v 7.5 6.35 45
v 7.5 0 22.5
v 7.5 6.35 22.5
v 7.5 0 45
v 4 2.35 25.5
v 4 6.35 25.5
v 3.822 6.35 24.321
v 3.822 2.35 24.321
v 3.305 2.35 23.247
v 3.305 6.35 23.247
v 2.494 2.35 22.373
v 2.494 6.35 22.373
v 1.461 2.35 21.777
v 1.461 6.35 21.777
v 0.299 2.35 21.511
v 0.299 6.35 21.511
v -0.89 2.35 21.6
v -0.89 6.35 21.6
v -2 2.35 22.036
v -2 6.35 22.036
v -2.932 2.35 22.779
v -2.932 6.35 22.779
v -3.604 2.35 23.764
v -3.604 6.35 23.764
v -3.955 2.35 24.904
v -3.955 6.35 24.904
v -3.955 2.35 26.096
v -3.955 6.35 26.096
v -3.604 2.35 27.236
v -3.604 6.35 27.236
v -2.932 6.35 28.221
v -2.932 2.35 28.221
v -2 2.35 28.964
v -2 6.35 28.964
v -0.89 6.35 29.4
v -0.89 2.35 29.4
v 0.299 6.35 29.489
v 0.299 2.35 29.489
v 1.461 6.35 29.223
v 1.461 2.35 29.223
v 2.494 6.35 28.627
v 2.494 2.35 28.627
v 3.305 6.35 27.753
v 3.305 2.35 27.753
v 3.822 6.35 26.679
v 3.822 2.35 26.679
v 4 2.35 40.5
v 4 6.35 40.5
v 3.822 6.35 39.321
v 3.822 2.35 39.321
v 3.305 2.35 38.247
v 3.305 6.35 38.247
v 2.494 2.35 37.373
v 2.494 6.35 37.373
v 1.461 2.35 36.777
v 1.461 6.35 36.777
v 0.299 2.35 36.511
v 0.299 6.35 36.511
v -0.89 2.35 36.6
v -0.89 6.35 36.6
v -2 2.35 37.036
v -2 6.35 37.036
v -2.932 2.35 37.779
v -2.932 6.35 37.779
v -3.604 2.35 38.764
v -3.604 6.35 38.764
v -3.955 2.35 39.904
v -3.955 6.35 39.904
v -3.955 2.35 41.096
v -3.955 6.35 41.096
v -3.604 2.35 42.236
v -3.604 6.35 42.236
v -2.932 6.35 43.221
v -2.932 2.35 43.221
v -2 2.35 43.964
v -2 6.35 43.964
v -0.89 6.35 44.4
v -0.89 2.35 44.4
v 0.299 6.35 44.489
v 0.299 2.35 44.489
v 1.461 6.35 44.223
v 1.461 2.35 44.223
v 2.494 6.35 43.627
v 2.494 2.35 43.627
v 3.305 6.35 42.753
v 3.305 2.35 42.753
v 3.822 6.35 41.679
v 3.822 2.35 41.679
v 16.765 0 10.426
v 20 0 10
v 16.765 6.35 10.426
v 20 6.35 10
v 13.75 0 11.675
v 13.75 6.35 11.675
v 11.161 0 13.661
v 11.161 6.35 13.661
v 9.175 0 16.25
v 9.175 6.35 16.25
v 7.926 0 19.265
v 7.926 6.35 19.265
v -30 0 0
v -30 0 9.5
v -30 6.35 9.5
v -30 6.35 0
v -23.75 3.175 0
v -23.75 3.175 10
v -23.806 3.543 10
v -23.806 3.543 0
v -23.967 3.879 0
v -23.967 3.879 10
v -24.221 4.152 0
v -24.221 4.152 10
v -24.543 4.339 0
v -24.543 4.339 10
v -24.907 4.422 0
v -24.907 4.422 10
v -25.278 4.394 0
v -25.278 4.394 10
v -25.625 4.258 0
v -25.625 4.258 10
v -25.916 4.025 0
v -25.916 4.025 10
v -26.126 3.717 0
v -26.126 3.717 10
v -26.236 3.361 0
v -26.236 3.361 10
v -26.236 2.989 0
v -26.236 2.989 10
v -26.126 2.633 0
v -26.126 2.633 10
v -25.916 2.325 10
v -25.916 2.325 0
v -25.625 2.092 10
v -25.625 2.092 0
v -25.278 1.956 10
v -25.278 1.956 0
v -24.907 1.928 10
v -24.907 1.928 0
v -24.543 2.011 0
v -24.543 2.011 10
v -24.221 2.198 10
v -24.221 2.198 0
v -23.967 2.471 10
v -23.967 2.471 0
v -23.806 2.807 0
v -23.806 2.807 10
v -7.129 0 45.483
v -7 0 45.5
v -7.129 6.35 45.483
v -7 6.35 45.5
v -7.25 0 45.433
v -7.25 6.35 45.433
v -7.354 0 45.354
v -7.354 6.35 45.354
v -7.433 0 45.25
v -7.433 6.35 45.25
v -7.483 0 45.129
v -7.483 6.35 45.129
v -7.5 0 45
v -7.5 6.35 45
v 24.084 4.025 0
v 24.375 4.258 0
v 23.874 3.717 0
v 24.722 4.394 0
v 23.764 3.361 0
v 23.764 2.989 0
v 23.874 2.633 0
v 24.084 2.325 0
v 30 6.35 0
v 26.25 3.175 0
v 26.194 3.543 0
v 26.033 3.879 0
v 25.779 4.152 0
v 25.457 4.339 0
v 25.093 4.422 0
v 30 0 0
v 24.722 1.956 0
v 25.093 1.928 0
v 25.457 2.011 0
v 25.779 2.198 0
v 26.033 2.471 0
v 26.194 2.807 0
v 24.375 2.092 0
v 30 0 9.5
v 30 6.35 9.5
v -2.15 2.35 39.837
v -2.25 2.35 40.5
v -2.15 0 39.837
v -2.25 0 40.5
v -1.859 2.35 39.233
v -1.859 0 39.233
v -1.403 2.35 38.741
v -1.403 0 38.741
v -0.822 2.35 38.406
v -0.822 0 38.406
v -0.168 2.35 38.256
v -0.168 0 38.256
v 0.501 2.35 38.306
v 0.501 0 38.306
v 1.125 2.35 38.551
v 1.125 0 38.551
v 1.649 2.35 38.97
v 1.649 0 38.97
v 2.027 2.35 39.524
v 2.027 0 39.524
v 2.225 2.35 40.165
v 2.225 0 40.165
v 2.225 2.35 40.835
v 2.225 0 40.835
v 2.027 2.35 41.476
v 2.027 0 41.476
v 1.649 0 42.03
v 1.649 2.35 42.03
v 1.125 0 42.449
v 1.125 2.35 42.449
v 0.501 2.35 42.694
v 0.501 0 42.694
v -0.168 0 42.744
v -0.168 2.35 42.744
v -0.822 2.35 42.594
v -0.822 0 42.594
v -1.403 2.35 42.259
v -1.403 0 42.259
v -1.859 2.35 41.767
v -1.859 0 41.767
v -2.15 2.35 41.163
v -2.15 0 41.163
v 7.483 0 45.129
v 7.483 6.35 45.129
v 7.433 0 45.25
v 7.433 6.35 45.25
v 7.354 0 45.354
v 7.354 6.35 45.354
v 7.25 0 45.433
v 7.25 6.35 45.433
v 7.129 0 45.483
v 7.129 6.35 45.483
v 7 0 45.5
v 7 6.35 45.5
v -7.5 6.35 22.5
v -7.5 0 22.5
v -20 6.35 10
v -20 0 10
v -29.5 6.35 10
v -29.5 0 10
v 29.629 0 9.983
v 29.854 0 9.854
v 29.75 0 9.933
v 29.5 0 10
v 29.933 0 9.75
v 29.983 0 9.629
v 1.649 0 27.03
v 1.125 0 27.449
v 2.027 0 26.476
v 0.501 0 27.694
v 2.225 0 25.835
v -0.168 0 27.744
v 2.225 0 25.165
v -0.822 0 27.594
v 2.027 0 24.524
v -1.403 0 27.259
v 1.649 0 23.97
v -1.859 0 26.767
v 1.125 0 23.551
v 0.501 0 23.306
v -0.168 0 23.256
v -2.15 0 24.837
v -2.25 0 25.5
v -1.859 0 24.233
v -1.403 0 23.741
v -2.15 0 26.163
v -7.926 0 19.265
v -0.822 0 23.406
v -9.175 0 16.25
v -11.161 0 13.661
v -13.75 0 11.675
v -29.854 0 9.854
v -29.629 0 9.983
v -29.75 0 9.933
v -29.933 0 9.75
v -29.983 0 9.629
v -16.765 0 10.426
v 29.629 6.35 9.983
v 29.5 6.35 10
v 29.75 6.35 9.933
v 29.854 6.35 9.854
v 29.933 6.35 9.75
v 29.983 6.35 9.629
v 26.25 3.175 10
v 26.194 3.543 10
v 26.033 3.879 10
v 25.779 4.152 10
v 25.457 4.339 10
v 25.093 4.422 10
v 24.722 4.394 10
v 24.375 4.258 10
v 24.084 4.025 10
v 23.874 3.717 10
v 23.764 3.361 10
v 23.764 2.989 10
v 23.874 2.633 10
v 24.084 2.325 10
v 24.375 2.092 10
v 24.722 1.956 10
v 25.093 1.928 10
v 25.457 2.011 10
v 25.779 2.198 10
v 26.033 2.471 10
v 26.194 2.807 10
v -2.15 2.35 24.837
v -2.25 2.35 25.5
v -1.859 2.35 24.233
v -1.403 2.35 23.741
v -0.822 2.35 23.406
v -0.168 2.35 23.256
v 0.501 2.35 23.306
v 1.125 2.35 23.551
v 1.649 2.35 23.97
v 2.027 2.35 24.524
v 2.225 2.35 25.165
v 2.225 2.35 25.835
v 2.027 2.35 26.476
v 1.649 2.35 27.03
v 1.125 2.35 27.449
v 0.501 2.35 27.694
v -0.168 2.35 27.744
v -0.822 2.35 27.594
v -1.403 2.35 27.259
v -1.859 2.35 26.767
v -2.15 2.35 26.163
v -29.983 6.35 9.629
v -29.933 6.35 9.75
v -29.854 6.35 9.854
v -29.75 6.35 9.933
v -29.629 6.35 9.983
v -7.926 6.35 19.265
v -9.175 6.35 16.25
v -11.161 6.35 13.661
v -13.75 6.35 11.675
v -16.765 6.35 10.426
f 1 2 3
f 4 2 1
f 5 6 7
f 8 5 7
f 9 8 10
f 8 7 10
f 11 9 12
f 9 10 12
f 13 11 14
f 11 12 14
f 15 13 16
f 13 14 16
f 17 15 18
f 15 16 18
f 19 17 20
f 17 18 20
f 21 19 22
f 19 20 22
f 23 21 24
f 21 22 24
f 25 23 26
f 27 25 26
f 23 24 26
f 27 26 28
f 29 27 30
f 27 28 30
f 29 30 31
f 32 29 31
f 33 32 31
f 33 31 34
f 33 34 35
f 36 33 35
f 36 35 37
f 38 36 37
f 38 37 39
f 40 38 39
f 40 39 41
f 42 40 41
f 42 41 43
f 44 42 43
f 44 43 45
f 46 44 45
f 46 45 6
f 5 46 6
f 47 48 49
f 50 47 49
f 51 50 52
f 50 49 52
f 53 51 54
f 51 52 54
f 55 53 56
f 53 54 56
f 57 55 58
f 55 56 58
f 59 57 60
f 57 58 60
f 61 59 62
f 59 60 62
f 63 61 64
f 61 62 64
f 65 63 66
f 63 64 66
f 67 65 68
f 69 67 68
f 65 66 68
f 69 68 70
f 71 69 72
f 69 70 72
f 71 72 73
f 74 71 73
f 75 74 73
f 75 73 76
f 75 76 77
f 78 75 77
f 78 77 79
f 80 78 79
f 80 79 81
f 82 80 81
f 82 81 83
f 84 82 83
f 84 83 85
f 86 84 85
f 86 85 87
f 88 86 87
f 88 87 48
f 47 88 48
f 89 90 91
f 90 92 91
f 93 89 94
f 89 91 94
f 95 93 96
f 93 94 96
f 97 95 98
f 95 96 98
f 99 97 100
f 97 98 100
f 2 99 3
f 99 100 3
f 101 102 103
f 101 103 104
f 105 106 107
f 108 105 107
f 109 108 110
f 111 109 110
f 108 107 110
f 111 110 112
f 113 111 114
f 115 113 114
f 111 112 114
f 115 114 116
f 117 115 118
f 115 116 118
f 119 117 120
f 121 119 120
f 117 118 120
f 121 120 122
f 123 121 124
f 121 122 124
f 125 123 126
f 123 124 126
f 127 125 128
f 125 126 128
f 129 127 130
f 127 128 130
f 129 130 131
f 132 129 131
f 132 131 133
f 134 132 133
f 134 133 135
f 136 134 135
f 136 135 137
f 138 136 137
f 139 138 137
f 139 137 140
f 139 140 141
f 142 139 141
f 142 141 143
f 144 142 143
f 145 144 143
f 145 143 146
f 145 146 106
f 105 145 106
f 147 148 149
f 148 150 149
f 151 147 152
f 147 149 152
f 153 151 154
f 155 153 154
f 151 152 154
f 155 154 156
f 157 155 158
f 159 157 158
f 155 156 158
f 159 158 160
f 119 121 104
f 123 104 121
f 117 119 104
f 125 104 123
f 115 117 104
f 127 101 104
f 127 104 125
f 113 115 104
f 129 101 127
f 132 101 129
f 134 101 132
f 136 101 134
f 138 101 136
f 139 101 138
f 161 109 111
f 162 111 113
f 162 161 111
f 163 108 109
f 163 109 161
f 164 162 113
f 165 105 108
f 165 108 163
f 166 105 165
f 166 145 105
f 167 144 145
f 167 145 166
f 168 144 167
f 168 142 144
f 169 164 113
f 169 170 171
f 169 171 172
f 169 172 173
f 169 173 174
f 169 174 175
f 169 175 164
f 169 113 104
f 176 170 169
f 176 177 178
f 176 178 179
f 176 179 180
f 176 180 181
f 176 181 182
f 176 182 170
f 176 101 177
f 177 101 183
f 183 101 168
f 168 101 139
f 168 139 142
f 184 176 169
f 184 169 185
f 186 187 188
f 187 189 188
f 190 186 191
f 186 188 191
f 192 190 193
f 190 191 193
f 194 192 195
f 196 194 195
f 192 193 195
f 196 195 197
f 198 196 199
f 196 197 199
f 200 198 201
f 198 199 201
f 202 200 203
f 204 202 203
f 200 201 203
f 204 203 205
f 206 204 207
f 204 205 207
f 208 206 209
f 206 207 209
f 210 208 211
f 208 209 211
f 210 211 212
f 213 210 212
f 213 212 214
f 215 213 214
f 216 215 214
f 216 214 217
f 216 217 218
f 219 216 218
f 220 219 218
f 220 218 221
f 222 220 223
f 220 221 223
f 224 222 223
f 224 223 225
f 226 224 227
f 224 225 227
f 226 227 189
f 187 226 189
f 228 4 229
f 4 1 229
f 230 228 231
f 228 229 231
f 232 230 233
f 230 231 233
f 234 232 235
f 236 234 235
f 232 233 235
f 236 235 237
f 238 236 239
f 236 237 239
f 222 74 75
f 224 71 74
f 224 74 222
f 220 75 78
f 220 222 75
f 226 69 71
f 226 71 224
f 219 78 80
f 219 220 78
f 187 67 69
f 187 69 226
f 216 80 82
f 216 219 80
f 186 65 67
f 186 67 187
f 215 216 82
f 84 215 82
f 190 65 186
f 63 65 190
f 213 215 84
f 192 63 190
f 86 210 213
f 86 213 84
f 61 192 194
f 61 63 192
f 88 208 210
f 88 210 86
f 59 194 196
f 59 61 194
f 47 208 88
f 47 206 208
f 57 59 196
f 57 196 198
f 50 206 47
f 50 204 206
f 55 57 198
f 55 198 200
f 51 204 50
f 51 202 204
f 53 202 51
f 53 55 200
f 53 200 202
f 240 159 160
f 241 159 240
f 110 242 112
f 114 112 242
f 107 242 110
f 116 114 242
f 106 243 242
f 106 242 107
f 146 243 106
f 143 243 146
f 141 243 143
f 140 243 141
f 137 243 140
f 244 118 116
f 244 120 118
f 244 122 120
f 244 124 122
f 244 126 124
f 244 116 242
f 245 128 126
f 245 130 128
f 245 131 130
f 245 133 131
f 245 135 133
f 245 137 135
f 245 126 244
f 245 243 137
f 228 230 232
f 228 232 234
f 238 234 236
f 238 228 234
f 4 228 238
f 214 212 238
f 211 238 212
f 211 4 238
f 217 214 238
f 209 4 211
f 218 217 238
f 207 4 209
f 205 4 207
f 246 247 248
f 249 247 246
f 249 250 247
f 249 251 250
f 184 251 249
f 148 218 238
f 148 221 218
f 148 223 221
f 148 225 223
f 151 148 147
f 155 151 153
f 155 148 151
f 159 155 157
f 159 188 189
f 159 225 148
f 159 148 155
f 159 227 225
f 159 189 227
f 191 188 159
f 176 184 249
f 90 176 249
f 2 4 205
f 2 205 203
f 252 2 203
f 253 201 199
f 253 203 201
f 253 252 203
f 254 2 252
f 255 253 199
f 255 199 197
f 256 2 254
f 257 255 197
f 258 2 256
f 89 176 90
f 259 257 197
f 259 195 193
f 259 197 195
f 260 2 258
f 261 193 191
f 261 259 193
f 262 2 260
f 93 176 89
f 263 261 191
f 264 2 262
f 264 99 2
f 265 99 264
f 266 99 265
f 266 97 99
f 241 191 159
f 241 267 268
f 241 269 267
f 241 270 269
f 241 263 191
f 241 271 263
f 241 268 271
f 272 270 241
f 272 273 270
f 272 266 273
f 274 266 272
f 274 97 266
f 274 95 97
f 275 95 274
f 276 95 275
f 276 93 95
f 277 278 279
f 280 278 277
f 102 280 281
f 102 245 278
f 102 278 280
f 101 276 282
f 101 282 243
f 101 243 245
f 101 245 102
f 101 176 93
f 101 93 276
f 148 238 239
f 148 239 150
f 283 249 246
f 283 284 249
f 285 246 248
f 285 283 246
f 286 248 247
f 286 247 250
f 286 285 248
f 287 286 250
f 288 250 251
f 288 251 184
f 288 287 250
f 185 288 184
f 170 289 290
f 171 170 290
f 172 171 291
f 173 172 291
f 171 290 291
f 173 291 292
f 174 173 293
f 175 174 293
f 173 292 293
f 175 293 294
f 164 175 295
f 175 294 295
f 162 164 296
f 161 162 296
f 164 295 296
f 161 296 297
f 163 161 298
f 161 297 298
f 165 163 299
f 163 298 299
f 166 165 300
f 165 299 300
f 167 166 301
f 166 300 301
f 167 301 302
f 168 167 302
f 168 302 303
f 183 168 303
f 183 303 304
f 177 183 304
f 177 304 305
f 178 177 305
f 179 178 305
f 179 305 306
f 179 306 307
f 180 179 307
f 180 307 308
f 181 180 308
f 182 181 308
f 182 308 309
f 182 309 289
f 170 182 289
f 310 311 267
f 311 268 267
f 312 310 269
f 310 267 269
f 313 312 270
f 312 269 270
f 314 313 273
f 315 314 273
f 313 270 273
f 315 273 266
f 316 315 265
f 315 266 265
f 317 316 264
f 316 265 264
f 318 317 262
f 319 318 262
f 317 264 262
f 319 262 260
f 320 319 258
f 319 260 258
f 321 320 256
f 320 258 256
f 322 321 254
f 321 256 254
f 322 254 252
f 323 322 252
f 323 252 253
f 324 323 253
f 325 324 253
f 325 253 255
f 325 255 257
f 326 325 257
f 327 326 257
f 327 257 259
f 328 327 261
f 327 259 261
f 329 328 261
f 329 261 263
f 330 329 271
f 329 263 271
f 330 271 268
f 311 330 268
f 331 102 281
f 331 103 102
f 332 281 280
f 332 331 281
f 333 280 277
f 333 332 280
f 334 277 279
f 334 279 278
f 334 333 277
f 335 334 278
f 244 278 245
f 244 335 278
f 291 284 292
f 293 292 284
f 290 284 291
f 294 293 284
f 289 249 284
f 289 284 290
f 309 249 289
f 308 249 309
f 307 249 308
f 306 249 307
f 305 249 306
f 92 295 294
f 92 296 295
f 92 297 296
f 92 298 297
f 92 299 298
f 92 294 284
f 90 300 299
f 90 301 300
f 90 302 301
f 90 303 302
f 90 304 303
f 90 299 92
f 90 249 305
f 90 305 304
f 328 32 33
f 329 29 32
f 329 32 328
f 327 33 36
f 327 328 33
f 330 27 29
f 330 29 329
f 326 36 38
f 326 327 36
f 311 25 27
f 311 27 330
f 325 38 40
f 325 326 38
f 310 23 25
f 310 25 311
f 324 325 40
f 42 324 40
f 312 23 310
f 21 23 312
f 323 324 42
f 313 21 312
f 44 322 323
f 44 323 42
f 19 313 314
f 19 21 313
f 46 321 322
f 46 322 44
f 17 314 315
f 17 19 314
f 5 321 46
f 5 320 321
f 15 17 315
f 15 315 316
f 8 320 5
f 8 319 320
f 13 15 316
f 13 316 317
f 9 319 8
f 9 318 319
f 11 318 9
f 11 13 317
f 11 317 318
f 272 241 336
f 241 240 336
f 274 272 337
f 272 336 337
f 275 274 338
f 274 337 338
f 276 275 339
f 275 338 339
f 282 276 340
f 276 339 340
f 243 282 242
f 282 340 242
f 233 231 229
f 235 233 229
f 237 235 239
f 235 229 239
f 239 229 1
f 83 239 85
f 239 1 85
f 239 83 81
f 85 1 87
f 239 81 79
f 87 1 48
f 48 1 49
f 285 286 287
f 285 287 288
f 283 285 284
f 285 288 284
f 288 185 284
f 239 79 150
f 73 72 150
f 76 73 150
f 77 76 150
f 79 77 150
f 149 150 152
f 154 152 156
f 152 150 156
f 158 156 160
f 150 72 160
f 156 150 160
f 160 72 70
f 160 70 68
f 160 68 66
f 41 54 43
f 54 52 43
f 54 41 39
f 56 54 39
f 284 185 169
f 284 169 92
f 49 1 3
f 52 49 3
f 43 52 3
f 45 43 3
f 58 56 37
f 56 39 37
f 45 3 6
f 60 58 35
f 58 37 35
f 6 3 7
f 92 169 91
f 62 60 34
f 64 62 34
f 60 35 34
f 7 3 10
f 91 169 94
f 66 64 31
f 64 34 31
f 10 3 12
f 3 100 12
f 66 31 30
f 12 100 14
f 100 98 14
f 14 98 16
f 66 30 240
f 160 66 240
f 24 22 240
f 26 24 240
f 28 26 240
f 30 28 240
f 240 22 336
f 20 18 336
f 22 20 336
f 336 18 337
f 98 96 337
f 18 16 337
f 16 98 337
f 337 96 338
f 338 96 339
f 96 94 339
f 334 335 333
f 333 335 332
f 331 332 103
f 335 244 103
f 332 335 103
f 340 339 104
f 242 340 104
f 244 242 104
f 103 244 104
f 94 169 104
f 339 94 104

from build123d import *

# Parameters (mm, degrees)
BOSS_EXTRUDE1_DEPTH            = 6.35
FILLET1_R                      = 12.5
CBORE_FOR_M4_SHCS1_D           = 4.5
CBORE_FOR_M4_SHCS1_CBORE_D     = 8
CBORE_FOR_M4_SHCS1_CBORE_DEPTH = 4
M3X0_5_TAPPED_HOLE1_D          = 2.5
M3X0_5_TAPPED_HOLE1_DEPTH      = 10
FILLET2_R                      = 0.5
FILLET3_R                      = 0.5


with BuildPart() as part:
    # Sketch2 → Boss-Extrude1 (new body)
    with BuildSketch(Plane(origin=(0, 0, 0), x_dir=(1, 0, 0), z_dir=(0, 1, 0))):
        Polygon((-30, 0), (30, 0), (30, -10), (7.5, -10), (7.5, -45.5), (-7.5, -45.5), (-7.5, -10), (-30, -10), align=None)
    extrude(amount=BOSS_EXTRUDE1_DEPTH)

    # Fillet1
    fillet1_edges = [part.edges().sort_by_distance(p)[0] for p in [
        (-7.5, 3.175, 10),
        (7.5, 3.175, 10),
    ]]
    fillet(fillet1_edges, radius=FILLET1_R)

    # CBORE for M4 SHCS1 (through all)
    with Locations(Plane(origin=(0, 6.35, 0), x_dir=(1, 0, 0), z_dir=(0, 1, 0))):
        with Locations((0, -40.5), (0, -25.5)):
            CounterBoreHole(CBORE_FOR_M4_SHCS1_D / 2, CBORE_FOR_M4_SHCS1_CBORE_D / 2, CBORE_FOR_M4_SHCS1_CBORE_DEPTH)

    # M3x0.5 Tapped Hole1
    with Locations(Plane(origin=(0, 0, 0), x_dir=(-1, 0, 0), z_dir=(0, 0, -1))):
        with Locations((-25, 3.175), (25, 3.175)):
            Hole(M3X0_5_TAPPED_HOLE1_D / 2, depth=M3X0_5_TAPPED_HOLE1_DEPTH)

    # Fillet2
    fillet2_edges = [part.edges().sort_by_distance(p)[0] for p in [
        (-30, 3.175, 10),
        (30, 3.175, 10),
    ]]
    fillet(fillet2_edges, radius=FILLET2_R)

    # Fillet3
    fillet3_edges = [part.edges().sort_by_distance(p)[0] for p in [
        (7.5, 3.175, 45.5),
        (-7.5, 3.175, 45.5),
    ]]
    fillet(fillet3_edges, radius=FILLET3_R)


solid = part.part
